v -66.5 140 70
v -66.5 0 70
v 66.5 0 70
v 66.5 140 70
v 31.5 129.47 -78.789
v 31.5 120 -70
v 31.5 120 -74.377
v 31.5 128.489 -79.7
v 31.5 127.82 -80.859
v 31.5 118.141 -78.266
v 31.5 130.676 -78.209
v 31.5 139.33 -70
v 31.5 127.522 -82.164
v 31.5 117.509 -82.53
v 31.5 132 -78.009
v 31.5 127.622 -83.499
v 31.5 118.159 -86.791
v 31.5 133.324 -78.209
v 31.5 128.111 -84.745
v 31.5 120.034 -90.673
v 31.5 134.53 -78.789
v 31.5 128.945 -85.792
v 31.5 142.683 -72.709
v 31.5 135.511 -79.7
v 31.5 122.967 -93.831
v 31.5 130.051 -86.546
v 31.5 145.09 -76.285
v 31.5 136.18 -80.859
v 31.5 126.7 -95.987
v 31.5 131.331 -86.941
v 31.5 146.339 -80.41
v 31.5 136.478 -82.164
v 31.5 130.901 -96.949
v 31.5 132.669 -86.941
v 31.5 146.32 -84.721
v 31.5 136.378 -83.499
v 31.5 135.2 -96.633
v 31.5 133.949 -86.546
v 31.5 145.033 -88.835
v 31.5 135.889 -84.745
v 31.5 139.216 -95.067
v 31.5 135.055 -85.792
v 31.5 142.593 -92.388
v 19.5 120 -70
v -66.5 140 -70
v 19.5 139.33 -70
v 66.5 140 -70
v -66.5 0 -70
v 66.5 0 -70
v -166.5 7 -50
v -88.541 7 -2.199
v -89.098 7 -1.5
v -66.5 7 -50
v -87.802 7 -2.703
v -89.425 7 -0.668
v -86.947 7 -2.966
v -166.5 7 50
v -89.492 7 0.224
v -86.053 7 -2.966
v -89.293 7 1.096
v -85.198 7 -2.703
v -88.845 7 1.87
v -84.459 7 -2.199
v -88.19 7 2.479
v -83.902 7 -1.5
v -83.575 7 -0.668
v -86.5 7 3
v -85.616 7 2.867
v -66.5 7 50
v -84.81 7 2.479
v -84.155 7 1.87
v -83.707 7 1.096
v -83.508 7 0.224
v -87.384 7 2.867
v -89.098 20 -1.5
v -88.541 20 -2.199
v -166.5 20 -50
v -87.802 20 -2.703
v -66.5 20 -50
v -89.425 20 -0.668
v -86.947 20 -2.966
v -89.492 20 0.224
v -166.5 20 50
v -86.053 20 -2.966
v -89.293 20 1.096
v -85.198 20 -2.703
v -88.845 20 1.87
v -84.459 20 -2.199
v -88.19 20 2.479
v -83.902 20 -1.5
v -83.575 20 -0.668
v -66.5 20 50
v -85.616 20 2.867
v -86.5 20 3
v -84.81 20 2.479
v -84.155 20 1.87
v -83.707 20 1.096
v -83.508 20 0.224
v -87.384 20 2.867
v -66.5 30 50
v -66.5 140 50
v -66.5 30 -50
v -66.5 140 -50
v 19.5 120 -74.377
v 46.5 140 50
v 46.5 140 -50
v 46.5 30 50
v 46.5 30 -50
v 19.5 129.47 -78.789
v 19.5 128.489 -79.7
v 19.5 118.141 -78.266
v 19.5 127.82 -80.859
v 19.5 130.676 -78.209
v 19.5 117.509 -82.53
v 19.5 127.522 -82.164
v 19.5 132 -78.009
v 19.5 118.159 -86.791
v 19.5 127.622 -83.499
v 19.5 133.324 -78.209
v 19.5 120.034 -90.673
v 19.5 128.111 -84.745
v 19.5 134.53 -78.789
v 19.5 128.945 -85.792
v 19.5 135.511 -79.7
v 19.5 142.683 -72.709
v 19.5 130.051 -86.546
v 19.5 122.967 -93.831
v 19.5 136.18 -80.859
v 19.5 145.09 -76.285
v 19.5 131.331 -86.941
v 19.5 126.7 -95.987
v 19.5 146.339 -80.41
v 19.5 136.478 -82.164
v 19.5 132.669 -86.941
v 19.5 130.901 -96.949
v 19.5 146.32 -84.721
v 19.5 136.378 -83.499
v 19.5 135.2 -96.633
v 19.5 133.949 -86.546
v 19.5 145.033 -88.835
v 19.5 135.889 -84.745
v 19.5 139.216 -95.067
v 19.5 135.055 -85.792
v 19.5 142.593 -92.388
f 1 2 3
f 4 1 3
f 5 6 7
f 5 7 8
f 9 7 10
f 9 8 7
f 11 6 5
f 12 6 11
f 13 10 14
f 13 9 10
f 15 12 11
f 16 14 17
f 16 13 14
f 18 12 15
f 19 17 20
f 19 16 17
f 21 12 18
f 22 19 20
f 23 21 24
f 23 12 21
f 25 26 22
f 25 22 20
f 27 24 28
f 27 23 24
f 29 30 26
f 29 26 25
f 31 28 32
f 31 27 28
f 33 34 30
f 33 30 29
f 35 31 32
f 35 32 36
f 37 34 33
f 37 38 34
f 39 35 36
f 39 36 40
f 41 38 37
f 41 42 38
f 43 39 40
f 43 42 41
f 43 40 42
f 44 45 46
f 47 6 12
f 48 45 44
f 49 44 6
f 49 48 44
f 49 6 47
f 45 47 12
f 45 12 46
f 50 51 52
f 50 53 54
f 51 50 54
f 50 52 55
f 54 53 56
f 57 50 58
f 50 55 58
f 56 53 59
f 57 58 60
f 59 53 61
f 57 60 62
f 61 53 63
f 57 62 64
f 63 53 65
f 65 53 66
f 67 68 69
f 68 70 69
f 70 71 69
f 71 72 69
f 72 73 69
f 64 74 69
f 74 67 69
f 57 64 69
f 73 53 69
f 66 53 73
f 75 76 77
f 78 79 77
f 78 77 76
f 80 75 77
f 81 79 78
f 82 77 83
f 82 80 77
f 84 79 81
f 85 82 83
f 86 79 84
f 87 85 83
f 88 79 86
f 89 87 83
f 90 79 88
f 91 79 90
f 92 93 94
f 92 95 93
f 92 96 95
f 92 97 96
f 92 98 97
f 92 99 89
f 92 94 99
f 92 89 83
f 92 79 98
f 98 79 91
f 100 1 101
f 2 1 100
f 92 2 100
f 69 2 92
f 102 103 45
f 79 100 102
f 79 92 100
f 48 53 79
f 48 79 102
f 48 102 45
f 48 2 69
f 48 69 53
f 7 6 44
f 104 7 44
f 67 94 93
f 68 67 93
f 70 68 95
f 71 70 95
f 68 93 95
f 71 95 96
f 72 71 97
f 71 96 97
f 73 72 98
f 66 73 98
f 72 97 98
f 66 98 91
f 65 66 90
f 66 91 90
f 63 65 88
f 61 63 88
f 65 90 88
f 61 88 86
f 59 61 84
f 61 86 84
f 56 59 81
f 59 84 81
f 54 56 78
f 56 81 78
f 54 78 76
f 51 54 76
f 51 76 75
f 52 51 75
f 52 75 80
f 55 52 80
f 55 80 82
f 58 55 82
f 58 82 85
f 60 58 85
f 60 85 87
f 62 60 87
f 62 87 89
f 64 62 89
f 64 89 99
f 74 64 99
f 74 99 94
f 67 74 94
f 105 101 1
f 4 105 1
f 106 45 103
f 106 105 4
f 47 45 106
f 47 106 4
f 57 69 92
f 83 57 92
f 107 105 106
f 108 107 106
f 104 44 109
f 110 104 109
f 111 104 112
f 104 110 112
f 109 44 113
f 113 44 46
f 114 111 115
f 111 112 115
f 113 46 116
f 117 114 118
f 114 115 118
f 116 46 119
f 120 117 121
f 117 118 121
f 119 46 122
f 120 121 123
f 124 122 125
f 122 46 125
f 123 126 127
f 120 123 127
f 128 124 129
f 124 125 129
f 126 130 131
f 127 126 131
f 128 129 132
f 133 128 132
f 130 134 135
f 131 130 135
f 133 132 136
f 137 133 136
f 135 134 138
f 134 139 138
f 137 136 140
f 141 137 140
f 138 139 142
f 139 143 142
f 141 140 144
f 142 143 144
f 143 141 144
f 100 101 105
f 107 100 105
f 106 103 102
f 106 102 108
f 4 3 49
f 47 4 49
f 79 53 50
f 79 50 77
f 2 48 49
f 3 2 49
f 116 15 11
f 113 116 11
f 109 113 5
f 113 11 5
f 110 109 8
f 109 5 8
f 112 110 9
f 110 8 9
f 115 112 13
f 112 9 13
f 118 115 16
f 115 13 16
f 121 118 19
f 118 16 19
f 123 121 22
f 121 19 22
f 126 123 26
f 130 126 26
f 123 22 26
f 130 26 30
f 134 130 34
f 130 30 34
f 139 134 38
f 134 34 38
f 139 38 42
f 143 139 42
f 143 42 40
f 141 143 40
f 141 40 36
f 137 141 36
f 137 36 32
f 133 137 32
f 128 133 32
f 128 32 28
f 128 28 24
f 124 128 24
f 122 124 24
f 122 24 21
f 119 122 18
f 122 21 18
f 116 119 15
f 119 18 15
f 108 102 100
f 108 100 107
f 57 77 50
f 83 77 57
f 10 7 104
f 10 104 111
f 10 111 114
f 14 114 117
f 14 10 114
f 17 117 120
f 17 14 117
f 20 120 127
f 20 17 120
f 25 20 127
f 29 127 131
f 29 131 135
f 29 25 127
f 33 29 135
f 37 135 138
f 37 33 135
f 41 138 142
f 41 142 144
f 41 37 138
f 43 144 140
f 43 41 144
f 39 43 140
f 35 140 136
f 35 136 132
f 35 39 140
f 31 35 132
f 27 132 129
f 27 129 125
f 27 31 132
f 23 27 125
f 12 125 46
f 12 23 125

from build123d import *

# Parameters (mm, degrees)
SKETCH_1_W          = 133
SKETCH_1_H          = 140
EXTRUDE_1_DEPTH     = 140
SKETCH_2_W          = 113
SKETCH_2_H          = 100
CUT_EXTRUDE_1_DEPTH = 110
SKETCH_3_W          = 100
SKETCH_3_H          = 13
EXTRUDE_2_DEPTH     = 100
SKETCH_4_R          = 3
CUT_EXTRUDE_3_DEPTH = 217.846143613
SKETCH_5_W          = 12
SKETCH_5_H          = 12
EXTRUDE_3_DEPTH     = 10
SKETCH_6_R          = 14.490887282
SKETCH_6_R_2        = 4.490887282
EXTRUDE_2_2_DEPTH   = 12
SKETCH_7_R          = 4.490887282
CUT_EXTRUDE_4_DEPTH = 265.708919896


with BuildPart() as part:
    # 草圖1 → 填料-伸長1 (new body)
    with BuildSketch(Plane(origin=(0, 0, 0), x_dir=(1, 0, 0), z_dir=(0, 1, 0))):
        Rectangle(SKETCH_1_W, SKETCH_1_H)
    extrude(amount=EXTRUDE_1_DEPTH)

    # 草圖2 → 除料-伸長1 (cut)
    with BuildSketch(Plane(origin=(0, 140, 0), x_dir=(1, 0, 0), z_dir=(0, 1, 0))):
        with Locations((-10, 0)):
            Rectangle(SKETCH_2_W, SKETCH_2_H)
    extrude(amount=-CUT_EXTRUDE_1_DEPTH, mode=Mode.SUBTRACT)

    # 草圖3 → Extrude 2 (add)
    with BuildSketch(Plane.ZY.offset(66.5)):
        with Locations((0, 13.5)):
            Rectangle(SKETCH_3_W, SKETCH_3_H)
    extrude(amount=EXTRUDE_2_DEPTH)

    # 草圖4 → 除料-伸長3 (cut, through all)
    with BuildSketch(Plane(origin=(0, 20, 0), x_dir=(1, 0, 0), z_dir=(0, 1, 0))):
        with Locations(Location((-86.5, 0, 0), (0, 0, 270))):
            Circle(SKETCH_4_R)
    extrude(amount=-CUT_EXTRUDE_3_DEPTH, mode=Mode.SUBTRACT)

    # 草圖5 → 填料-伸長3 (add)
    with BuildSketch(Plane(origin=(0, 0, -70), x_dir=(-1, 0, 0), z_dir=(0, 0, -1))):
        with Locations((-25.5, 126)):
            Rectangle(SKETCH_5_W, SKETCH_5_H)
    extrude(amount=EXTRUDE_3_DEPTH)

    # 草圖6 → Extrude 2 2 (add)
    with BuildSketch(Plane(origin=(31.5, 0, 0), x_dir=(0, 0, -1), z_dir=(1, 0, 0))):
        with Locations((82.5, 132)):
            Circle(SKETCH_6_R)
        with Locations((82.5, 132)):
            Circle(SKETCH_6_R_2, mode=Mode.SUBTRACT)
    extrude(amount=-EXTRUDE_2_2_DEPTH)

    # 草圖7 → 除料-伸長4 (cut, through all)
    with BuildSketch(Plane(origin=(31.5, 0, 0), x_dir=(0, 0, -1), z_dir=(1, 0, 0))):
        with Locations((82.5, 132)):
            Circle(SKETCH_7_R)
    extrude(amount=-CUT_EXTRUDE_4_DEPTH, mode=Mode.SUBTRACT)


solid = part.part
